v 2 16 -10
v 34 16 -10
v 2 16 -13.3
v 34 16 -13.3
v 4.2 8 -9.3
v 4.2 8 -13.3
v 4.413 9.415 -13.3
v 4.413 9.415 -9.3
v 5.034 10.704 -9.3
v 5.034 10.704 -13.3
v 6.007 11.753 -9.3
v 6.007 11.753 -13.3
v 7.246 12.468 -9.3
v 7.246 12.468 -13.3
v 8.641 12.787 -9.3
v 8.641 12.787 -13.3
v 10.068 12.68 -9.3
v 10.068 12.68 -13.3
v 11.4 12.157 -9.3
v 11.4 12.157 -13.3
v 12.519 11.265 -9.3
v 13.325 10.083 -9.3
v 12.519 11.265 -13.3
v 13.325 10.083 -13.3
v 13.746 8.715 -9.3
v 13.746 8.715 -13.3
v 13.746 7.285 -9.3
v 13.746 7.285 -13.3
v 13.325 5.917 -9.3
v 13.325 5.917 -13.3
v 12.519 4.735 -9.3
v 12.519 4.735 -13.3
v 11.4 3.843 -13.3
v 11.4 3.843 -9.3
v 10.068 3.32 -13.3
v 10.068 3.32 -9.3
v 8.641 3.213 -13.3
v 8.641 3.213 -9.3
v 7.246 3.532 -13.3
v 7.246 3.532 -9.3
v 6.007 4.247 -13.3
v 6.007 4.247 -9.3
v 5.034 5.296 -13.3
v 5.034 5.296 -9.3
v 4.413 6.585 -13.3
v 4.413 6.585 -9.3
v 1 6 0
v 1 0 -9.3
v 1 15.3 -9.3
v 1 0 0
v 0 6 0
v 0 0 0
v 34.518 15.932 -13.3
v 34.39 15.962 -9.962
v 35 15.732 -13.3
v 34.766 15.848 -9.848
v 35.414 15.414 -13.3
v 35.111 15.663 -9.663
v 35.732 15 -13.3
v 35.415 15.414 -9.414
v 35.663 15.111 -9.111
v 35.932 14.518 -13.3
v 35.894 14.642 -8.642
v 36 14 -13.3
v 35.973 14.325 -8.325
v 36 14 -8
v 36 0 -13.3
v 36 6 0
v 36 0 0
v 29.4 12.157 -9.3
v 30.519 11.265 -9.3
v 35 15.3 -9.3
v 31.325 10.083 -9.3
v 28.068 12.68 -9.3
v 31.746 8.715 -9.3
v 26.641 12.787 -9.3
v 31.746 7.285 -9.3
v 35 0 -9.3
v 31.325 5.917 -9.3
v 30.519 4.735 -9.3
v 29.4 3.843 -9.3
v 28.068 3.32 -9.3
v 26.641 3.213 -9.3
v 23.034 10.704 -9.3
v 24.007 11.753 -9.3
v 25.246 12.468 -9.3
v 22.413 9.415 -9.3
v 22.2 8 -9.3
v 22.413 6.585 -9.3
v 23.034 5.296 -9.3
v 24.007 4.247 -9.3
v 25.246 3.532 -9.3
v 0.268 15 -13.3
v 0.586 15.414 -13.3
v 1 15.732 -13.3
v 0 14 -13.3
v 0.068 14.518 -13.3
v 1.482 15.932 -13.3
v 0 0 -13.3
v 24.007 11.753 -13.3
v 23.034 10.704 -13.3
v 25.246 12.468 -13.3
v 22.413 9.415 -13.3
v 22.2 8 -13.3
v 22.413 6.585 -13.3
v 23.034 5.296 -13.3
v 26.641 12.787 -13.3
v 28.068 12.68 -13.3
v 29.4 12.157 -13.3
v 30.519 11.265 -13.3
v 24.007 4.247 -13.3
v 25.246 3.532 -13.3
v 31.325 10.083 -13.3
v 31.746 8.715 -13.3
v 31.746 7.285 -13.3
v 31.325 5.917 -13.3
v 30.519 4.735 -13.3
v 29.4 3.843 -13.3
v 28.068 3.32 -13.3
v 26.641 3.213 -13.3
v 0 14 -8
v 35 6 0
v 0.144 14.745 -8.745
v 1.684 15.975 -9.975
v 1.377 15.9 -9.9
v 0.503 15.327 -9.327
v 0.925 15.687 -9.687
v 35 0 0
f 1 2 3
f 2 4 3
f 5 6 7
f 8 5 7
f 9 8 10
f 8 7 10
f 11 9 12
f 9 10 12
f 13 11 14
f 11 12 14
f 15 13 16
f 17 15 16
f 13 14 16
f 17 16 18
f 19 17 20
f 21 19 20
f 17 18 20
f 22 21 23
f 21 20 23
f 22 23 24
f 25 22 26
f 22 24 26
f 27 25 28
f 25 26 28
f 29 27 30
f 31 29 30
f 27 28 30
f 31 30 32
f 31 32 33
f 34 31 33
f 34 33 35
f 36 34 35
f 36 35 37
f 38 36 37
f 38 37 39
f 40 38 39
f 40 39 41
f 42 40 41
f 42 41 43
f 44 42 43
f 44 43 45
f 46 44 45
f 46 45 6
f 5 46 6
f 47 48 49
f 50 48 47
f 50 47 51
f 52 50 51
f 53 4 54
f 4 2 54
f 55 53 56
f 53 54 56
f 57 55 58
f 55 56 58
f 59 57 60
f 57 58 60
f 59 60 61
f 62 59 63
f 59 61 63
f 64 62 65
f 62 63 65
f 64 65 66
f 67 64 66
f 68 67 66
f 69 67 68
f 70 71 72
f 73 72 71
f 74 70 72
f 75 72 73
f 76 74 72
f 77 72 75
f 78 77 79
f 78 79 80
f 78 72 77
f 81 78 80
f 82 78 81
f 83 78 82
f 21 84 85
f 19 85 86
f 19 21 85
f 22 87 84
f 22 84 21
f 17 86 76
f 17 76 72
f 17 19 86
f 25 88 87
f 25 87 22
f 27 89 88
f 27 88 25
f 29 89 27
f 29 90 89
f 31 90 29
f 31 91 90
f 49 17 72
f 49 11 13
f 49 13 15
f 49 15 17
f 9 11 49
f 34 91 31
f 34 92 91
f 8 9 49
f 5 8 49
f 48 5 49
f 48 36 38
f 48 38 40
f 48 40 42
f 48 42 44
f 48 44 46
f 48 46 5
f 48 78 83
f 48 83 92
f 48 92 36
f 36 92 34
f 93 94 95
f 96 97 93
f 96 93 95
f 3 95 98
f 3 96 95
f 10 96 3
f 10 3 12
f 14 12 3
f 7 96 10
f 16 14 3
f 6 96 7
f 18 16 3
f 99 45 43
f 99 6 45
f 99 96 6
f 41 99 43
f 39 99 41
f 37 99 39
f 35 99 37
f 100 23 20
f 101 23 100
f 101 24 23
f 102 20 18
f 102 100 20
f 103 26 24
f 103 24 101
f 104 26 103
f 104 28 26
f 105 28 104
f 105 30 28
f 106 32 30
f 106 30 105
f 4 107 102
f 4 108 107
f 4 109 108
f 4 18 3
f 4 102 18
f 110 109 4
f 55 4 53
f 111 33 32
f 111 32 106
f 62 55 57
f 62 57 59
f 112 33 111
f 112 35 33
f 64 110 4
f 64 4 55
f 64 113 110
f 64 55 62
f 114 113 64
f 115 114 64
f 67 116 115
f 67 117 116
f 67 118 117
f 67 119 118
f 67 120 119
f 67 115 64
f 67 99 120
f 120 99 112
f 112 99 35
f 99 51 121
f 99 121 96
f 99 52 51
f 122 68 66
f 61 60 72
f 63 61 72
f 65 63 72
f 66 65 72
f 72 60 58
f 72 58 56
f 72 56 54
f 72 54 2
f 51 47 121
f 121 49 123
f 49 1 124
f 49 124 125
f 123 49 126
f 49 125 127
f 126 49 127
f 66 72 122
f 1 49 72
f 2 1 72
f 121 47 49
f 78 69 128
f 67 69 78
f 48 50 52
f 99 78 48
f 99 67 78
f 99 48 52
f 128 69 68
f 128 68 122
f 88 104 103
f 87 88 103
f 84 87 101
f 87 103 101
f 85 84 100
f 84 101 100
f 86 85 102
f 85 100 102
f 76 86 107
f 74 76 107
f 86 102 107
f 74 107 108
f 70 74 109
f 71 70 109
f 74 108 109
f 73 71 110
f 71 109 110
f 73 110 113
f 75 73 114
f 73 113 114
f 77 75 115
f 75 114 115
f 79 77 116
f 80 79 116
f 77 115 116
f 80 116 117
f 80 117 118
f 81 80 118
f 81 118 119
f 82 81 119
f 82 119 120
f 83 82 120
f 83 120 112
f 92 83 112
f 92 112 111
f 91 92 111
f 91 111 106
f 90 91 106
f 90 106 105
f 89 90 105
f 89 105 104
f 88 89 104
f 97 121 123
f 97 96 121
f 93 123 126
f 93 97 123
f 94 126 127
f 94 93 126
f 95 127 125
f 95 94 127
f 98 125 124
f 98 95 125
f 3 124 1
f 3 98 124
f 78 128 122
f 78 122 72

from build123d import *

# Parameters (mm, degrees)
BOSS_EXTRUDE1_DEPTH = 16
CHAMFER1_SIZE       = 10
FILLET1_R           = 2
SKETCH3_R           = 4.8
CUT_EXTRUDE1_DEPTH  = 42.57992304


with BuildPart() as part:
    # Sketch2 → Boss-Extrude1 (new body)
    with BuildSketch(Plane(origin=(0, 0, 0), x_dir=(1, 0, 0), z_dir=(0, 1, 0))):
        Polygon((0, 0), (0, 13.3), (36, 13.3), (36, 0), (35, 0), (35, 9.3), (1, 9.3), (1, 0), align=None)
    extrude(amount=BOSS_EXTRUDE1_DEPTH)

    # Chamfer1
    chamfer1_edges = [part.edges().sort_by_distance(p)[0] for p in [
        (0.5, 16, 0),
    ]]
    chamfer(chamfer1_edges, length=CHAMFER1_SIZE)

    # Fillet1
    fillet1_edges = [part.edges().sort_by_distance(p)[0] for p in [
        (36, 16, -11.65),
        (0, 16, -11.65),
    ]]
    fillet(fillet1_edges, radius=FILLET1_R)

    # Sketch3 → Cut-Extrude1 (cut, through all)
    with BuildSketch(Plane(origin=(0, 0, -13.3), x_dir=(-1, 0, 0), z_dir=(0, 0, -1))):
        with Locations((-27, 8)):
            Circle(SKETCH3_R)
        with Locations((-9, 8)):
            Circle(SKETCH3_R)
    extrude(amount=-CUT_EXTRUDE1_DEPTH, mode=Mode.SUBTRACT)


solid = part.part
